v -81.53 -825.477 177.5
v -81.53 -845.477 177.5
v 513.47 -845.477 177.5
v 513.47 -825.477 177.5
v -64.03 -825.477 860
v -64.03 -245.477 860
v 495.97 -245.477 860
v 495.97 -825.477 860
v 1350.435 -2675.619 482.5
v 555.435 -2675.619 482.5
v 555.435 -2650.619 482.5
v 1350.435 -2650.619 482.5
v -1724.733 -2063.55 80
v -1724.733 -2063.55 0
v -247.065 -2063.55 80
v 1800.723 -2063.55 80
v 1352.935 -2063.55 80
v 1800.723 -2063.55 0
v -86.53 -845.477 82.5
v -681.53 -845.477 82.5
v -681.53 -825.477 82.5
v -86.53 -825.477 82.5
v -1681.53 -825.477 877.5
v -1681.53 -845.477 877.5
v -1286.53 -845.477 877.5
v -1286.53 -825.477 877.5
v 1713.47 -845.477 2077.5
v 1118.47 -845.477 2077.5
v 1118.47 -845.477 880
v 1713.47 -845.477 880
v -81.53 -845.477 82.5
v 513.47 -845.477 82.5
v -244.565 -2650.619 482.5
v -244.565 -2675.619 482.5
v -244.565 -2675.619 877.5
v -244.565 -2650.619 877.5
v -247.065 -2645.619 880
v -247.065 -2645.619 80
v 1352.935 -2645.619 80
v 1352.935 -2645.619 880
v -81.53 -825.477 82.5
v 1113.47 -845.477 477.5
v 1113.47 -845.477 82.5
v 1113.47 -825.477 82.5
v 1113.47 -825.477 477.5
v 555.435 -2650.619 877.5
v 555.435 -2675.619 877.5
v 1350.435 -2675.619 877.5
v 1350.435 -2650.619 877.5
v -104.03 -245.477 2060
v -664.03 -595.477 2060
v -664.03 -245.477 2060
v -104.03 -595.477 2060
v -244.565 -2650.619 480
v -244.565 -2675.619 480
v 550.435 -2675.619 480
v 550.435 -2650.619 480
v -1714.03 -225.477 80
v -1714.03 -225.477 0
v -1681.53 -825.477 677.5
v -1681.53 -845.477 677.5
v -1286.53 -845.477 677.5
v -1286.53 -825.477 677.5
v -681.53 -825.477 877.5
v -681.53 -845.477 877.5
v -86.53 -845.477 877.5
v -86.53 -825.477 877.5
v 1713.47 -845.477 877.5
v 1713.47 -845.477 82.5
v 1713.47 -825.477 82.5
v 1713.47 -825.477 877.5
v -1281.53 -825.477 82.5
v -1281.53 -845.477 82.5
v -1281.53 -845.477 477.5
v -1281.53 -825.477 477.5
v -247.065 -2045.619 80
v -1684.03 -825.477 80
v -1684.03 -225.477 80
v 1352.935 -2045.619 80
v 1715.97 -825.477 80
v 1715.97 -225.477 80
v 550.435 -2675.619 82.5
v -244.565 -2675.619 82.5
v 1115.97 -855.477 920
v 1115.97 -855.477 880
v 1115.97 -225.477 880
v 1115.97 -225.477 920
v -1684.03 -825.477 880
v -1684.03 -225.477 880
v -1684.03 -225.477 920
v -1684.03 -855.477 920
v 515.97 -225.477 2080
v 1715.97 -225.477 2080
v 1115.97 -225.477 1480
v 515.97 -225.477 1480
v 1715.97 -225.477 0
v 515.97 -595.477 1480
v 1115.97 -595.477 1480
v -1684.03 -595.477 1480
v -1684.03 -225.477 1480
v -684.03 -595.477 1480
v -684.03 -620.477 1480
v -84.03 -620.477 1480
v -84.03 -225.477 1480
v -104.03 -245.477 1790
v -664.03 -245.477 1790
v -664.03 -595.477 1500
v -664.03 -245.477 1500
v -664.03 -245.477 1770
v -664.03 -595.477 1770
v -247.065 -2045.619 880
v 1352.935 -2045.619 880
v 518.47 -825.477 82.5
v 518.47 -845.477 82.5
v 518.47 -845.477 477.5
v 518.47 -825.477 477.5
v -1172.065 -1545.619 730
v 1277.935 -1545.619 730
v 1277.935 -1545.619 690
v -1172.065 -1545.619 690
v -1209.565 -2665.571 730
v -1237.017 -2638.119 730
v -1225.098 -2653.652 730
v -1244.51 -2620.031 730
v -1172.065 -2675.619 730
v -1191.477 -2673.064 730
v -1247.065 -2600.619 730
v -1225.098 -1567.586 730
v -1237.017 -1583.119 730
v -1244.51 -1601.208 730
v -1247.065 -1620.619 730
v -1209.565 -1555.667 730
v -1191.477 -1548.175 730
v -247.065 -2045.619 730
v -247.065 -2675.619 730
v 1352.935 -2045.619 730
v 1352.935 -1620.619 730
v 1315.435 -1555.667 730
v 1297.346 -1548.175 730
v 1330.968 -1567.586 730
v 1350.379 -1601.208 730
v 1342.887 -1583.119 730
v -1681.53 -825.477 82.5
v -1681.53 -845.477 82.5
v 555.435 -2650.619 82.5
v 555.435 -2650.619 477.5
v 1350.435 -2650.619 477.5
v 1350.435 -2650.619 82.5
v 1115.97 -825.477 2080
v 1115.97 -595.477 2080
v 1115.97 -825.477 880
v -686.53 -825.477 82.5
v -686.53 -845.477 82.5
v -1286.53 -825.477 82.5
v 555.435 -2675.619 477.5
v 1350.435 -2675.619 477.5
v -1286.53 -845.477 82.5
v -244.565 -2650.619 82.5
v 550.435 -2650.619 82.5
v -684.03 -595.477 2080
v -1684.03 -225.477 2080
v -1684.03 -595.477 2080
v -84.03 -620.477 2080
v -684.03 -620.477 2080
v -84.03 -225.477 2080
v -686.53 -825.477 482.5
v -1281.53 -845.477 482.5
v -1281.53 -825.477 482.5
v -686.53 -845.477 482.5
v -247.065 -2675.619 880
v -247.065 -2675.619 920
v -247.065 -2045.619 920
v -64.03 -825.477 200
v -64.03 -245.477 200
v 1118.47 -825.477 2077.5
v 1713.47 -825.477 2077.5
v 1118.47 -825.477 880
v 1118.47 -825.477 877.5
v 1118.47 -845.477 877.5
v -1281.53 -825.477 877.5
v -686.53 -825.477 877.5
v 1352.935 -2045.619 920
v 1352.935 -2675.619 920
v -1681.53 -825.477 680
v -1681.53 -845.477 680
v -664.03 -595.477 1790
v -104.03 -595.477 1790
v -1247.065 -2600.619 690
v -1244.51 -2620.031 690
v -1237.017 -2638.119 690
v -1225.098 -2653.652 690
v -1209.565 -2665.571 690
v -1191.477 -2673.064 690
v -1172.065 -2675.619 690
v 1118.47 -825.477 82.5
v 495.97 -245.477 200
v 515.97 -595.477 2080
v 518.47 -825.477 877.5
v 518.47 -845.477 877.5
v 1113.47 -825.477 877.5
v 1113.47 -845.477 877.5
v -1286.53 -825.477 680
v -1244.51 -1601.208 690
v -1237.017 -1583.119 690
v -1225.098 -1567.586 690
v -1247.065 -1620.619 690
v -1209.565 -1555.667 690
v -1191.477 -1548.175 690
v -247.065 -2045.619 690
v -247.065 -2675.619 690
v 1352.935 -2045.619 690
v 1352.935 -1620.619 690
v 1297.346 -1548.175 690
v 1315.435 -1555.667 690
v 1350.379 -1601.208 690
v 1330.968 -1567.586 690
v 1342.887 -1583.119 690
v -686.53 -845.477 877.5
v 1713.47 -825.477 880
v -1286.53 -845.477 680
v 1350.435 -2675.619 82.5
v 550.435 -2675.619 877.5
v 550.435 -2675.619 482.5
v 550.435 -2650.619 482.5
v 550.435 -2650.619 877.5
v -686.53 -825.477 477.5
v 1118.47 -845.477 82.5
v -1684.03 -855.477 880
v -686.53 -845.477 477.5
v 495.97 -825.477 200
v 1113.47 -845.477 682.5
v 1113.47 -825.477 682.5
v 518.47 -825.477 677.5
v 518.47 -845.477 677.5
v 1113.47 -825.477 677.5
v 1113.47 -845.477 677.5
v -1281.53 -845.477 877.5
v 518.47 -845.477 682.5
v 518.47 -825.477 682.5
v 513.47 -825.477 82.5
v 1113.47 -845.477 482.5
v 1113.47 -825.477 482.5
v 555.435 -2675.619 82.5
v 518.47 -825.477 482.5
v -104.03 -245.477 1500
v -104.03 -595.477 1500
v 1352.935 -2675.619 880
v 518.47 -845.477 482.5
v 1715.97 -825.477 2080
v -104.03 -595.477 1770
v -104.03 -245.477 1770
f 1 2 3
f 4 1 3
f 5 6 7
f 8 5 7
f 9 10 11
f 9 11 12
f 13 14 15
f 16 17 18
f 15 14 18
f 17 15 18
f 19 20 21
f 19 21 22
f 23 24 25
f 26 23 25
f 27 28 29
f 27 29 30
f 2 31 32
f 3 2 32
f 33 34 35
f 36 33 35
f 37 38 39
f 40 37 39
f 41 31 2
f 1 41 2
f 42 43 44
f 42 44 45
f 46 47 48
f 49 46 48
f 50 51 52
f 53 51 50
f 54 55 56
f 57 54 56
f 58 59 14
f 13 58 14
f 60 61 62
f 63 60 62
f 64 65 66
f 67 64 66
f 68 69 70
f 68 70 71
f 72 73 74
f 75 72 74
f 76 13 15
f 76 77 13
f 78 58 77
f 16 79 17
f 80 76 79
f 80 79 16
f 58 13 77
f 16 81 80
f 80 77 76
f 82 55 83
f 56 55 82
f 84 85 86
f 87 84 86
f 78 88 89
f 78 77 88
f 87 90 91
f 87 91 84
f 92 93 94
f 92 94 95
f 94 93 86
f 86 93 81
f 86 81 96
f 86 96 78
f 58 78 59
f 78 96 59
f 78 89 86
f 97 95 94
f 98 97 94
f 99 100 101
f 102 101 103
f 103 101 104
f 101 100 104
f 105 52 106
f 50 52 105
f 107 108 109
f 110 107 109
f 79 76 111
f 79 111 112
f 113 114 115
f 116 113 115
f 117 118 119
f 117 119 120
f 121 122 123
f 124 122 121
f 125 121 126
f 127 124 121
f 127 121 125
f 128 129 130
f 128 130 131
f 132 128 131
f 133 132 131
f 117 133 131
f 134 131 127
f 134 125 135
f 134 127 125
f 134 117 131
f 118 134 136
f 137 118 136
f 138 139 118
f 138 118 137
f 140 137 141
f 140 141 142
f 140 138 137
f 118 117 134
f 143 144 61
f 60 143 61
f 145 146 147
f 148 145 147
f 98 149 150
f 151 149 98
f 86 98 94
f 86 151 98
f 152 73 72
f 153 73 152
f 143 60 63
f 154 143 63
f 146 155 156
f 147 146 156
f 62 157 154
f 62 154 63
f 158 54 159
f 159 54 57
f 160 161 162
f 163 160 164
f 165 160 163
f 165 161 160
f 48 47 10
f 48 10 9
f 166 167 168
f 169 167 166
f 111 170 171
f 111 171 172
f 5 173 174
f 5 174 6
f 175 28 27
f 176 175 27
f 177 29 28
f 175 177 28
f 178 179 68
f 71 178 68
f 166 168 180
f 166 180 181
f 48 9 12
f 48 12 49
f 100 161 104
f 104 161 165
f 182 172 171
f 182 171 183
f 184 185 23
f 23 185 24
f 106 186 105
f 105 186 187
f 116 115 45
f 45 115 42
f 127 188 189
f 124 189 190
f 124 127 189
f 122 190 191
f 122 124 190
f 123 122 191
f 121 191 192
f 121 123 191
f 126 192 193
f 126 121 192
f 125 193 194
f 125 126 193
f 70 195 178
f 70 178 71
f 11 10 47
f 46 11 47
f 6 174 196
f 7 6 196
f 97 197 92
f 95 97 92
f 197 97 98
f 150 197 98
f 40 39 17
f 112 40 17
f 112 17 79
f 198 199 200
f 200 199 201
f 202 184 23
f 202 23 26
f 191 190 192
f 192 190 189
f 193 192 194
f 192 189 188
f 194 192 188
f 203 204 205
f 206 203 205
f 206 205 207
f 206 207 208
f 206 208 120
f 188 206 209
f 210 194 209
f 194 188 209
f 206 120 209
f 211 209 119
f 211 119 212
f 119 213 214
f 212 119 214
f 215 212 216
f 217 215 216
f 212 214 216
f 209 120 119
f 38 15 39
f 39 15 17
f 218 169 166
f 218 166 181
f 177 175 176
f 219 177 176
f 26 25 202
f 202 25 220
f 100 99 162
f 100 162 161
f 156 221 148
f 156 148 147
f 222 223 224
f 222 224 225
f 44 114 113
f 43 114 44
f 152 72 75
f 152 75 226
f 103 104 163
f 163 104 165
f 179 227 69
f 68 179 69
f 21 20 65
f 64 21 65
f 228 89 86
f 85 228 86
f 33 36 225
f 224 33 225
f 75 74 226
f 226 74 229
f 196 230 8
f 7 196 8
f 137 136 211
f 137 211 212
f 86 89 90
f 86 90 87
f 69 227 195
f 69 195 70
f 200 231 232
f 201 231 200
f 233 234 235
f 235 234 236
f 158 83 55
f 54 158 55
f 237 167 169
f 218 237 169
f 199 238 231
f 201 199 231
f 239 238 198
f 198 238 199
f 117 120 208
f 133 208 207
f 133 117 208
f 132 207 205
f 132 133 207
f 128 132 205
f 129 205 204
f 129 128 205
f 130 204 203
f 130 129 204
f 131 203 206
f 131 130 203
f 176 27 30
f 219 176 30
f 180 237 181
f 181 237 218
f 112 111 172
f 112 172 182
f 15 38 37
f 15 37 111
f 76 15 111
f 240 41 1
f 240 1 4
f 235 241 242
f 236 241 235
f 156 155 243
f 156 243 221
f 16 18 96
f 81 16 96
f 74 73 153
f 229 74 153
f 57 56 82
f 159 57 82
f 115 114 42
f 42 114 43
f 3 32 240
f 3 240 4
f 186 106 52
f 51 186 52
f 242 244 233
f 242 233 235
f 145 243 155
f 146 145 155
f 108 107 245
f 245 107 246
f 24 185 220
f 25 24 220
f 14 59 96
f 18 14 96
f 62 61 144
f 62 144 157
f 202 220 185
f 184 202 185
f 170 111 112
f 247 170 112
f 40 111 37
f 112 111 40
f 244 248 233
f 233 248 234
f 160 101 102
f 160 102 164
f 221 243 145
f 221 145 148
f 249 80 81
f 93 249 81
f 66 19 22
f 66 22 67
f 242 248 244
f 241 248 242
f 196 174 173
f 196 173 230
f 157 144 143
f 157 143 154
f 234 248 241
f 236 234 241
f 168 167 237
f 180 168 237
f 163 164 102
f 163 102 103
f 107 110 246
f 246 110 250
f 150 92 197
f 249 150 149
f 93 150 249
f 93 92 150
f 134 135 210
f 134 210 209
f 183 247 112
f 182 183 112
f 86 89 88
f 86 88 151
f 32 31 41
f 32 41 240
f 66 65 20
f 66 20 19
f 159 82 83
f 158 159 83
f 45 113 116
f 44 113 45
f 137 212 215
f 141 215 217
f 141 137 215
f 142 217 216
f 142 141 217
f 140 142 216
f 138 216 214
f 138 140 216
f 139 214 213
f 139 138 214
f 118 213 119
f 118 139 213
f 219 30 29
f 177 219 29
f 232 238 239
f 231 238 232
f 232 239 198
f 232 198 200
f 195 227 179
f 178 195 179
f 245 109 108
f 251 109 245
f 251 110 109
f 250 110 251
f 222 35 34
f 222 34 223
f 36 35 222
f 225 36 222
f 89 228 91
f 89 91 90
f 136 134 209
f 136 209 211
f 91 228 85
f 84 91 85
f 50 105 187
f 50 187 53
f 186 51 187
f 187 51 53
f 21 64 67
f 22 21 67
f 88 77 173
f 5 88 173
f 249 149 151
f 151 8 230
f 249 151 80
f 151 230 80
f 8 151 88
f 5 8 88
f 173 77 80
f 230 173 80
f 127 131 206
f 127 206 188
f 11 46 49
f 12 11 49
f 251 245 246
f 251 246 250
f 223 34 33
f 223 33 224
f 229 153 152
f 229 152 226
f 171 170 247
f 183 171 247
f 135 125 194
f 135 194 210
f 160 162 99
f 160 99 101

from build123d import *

# Parameters (mm, degrees)
F7_W      = 600
F7_H      = 600
F13_DEPTH = 2000
F8_W      = 600
F8_H      = 600
F14_DEPTH = 800
F9_W      = 600
F9_H      = 600
F15_DEPTH = 800
F10_W     = 600
F10_H     = 600
F16_DEPTH = 800
F11_W     = 600
F11_H     = 600
F17_DEPTH = 800
F12_W     = 400
F12_H     = 600
F18_DEPTH = 800
F23_W     = 400
F23_H     = 370
F24_DEPTH = 1200
F25_W     = 400
F25_H     = 600
F26_DEPTH = 370
F22_W     = 600
F22_H     = 370
F27_DEPTH = 600
F21_W     = 600
F21_H     = 370
F28_DEPTH = 600
F20_W     = 600
F20_H     = 370
F29_DEPTH = 600
F30_DEPTH = 20
F32_DEPTH = 20
F31_W     = 595
F31_H     = 795
F33_DEPTH = 20
F35_DEPTH = 20
F34_W     = 395
F34_H     = 595
F36_DEPTH = 20
F37_W     = 600
F37_H     = 400
F37_W_2   = 595
F37_H_2   = 395
F38_DEPTH = 20
F39_DEPTH = 20
F40_W     = 600
F40_H     = 800
F40_W_2   = 595
F40_H_2   = 795
F41_DEPTH = 20
F42_W     = 600
F42_H     = 400
F42_W_2   = 595
F42_H_2   = 395
F43_DEPTH = 20
F44_W     = 600
F44_H     = 200
F44_W_2   = 595
F44_H_2   = 195
F45_DEPTH = 20
F46_W     = 600
F46_H     = 200
F46_W_2   = 595
F46_H_2   = 195
F47_DEPTH = 20
F48_W     = 600
F48_H     = 100
F48_W_2   = 595
F48_H_2   = 95
F49_DEPTH = 20
F50_W     = 600
F50_H     = 700
F50_W_2   = 560
F50_H_2   = 660
F51_DEPTH = 20
F52_DEPTH = 25
F54_W     = 560
F54_H     = 660
F55_DEPTH = 580
F57_W     = 560
F57_H     = 270
F58_DEPTH = 350
F59_DEPTH = 350
F60_W     = 600
F60_H     = 600
F61_DEPTH = 25
F64_DEPTH = 80
F62_W     = 800
F62_H     = 600
F65_DEPTH = 800
F63_W     = 800
F63_H     = 600
F66_DEPTH = 800
F68_W     = 1600
F68_H     = 800
F69_DEPTH = 25
F70_DEPTH = 20
F71_W     = 800
F71_H     = 400
F71_W_2   = 795
F71_H_2   = 395
F72_DEPTH = 25
F74_DEPTH = 25
F75_W     = 800
F75_H     = 400
F75_W_2   = 795
F75_H_2   = 395
F76_DEPTH = 25
F77_W     = 800
F77_H     = 400
F77_W_2   = 795
F77_H_2   = 395
F78_DEPTH = 25
F80_W     = 2800
F80_H     = 630
F82_DEPTH = 40
F81_W     = 1600
F81_H     = 630
F83_DEPTH = 40
F86_DEPTH = 40


with BuildPart() as f13:
    # F7 (on offset) → F13 (new body)
    with BuildSketch(Plane.XY.offset(80)):
        with Locations((1415.9702295065, -525.4769355059)):
            Rectangle(F7_W, F7_H)
    extrude(amount=F13_DEPTH)

    # F8 (on offset) → F14 (join)
    with BuildSketch(Plane.XY.offset(80)):
        with Locations((815.9702295065, -525.4769355059)):
            Rectangle(F8_W, F8_H)
    extrude(amount=F14_DEPTH)

    # F9 (on offset) → F15 (join)
    with BuildSketch(Plane.XY.offset(80)):
        with Locations((215.9702295065, -525.4769355059)):
            Rectangle(F9_W, F9_H)
    extrude(amount=F15_DEPTH)

    # F10 (on offset) → F16 (join)
    with BuildSketch(Plane.XY.offset(80)):
        with Locations((-384.0297704935, -525.4769355059)):
            Rectangle(F10_W, F10_H)
    extrude(amount=F16_DEPTH)

    # F11 (on offset) → F17 (join)
    with BuildSketch(Plane.XY.offset(80)):
        with Locations((-984.0297704935, -525.4769355059)):
            Rectangle(F11_W, F11_H)
    extrude(amount=F17_DEPTH)

    # F12 (on offset) → F18 (join)
    with BuildSketch(Plane.XY.offset(80)):
        with Locations((-1484.0297704935, -525.4769355059)):
            Rectangle(F12_W, F12_H)
    extrude(amount=F18_DEPTH)

    # F23 (on face) → F24 (join)
    with BuildSketch(Plane.XY.offset(880)):
        with Locations((-1484.0297704935, -410.4769355059)):
            Rectangle(F23_W, F23_H)
    extrude(amount=F24_DEPTH)

    # F25 (on face) → F26 (cut)
    with BuildSketch(Plane.XZ.offset(595.4769355059)):
        with Locations((-1484.0297704935, 1180)):
            Rectangle(F25_W, F25_H)
    extrude(amount=-F26_DEPTH, mode=Mode.SUBTRACT)

    # F22 (on face) → F27 (join)
    with BuildSketch(Plane.XY.offset(2080)):
        with Locations((-984.0297704935, -410.4769355059)):
            Rectangle(F22_W, F22_H)
    extrude(amount=-F27_DEPTH)

    # F21 (on face) → F28 (join)
    with BuildSketch(Plane.XY.offset(2080)):
        with Locations((-384.0297704935, -410.4769355059)):
            Rectangle(F21_W, F21_H)
    extrude(amount=-F28_DEPTH)

    # F20 (on face) → F29 (join)
    with BuildSketch(Plane.XY.offset(2080)):
        with Locations((815.9702295065, -410.4769355059)):
            Rectangle(F20_W, F20_H)
    extrude(amount=-F29_DEPTH)


with BuildPart() as f30:
    # F30 (new): a face of the model
    f30_faces = [f13.part.faces().sort_by_distance(p)[0] for p in [
        (308.9934853204, -825.4769355059, 689.3023255814),
    ]]
    extrude(f30_faces, amount=F30_DEPTH)

    # F31 (on face) → F32 (cut)
    with BuildSketch(Plane.XZ.offset(845.4769355059)):
        Polygon((1715.9702295065, 880), (1715.9702295065, 2080), (1115.9702295065, 2080), (1115.9702295065, 880), (1118.4702295065, 880), (1118.4702295065, 2077.5), (1713.4702295065, 2077.5), (1713.4702295065, 880), align=None)
    extrude(amount=-F32_DEPTH, mode=Mode.SUBTRACT)

    # F31 (on face) → F33 (cut)
    with BuildSketch(Plane.XZ.offset(845.4769355059)):
        Polygon((1715.9702295065, 80), (1715.9702295065, 880), (1713.4702295065, 880), (1118.4702295065, 880), (1115.9702295065, 880), (1115.9702295065, 80), align=None)
        with Locations((1415.9702295065, 480)):
            Rectangle(F31_W, F31_H, mode=Mode.SUBTRACT)
    extrude(amount=-F33_DEPTH, mode=Mode.SUBTRACT)

    # F34 (on face) → F35 (cut)
    with BuildSketch(Plane.XZ.offset(845.4769355059)):
        Polygon((-1284.0297704935, 880), (-1684.0297704935, 880), (-1684.0297704935, 680), (-1681.5297704935, 680), (-1681.5297704935, 877.5), (-1286.5297704935, 877.5), (-1286.5297704935, 680), (-1284.0297704935, 680), align=None)
    extrude(amount=-F35_DEPTH, mode=Mode.SUBTRACT)

    # F34 (on face) → F36 (cut)
    with BuildSketch(Plane.XZ.offset(845.4769355059)):
        Polygon((-1681.5297704935, 680), (-1684.0297704935, 680), (-1684.0297704935, 80), (-1284.0297704935, 80), (-1284.0297704935, 680), (-1286.5297704935, 680), align=None)
        with Locations((-1484.0297704935, 380)):
            Rectangle(F34_W, F34_H, mode=Mode.SUBTRACT)
    extrude(amount=-F36_DEPTH, mode=Mode.SUBTRACT)

    # F37 (on face) → F38 (cut)
    with BuildSketch(Plane.XZ.offset(845.4769355059)):
        with Locations((-984.0297704935, 680)):
            Rectangle(F37_W, F37_H)
        with Locations((-984.0297704935, 680)):
            Rectangle(F37_W_2, F37_H_2, mode=Mode.SUBTRACT)
    extrude(amount=-F38_DEPTH, mode=Mode.SUBTRACT)

    # F37 (on face) → F39 (cut)
    with BuildSketch(Plane.XZ.offset(845.4769355059)):
        with Locations((-984.0297704935, 280)):
            Rectangle(F37_W, F37_H)
        with Locations((-984.0297704935, 280)):
            Rectangle(F37_W_2, F37_H_2, mode=Mode.SUBTRACT)
    extrude(amount=-F39_DEPTH, mode=Mode.SUBTRACT)

    # F40 (on face) → F41 (cut)
    with BuildSketch(Plane.XZ.offset(845.4769355059)):
        with Locations((-384.0297704935, 480)):
            Rectangle(F40_W, F40_H)
        with Locations((-384.0297704935, 480)):
            Rectangle(F40_W_2, F40_H_2, mode=Mode.SUBTRACT)
    extrude(amount=-F41_DEPTH, mode=Mode.SUBTRACT)

    # F42 (on face) → F43 (cut)
    with BuildSketch(Plane.XZ.offset(845.4769355059)):
        with Locations((815.9702295065, 280)):
            Rectangle(F42_W, F42_H)
        with Locations((815.9702295065, 280)):
            Rectangle(F42_W_2, F42_H_2, mode=Mode.SUBTRACT)
    extrude(amount=-F43_DEPTH, mode=Mode.SUBTRACT)

    # F44 (on face) → F45 (cut)
    with BuildSketch(Plane.XZ.offset(845.4769355059)):
        with Locations((815.9702295065, 580)):
            Rectangle(F44_W, F44_H)
        with Locations((815.9702295065, 580)):
            Rectangle(F44_W_2, F44_H_2, mode=Mode.SUBTRACT)
    extrude(amount=-F45_DEPTH, mode=Mode.SUBTRACT)

    # F46 (on face) → F47 (cut)
    with BuildSketch(Plane.XZ.offset(845.4769355059)):
        with Locations((815.9702295065, 780)):
            Rectangle(F46_W, F46_H)
        with Locations((815.9702295065, 780)):
            Rectangle(F46_W_2, F46_H_2, mode=Mode.SUBTRACT)
    extrude(amount=-F47_DEPTH, mode=Mode.SUBTRACT)

    # F48 (on face) → F49 (cut)
    with BuildSketch(Plane.XZ.offset(845.4769355059)):
        with Locations((215.9702295065, 130)):
            Rectangle(F48_W, F48_H)
        with Locations((215.9702295065, 130)):
            Rectangle(F48_W_2, F48_H_2, mode=Mode.SUBTRACT)
    extrude(amount=-F49_DEPTH, mode=Mode.SUBTRACT)

    # F50 (on face) → F51 (cut)
    with BuildSketch(Plane.XZ.offset(845.4769355059)):
        with Locations((215.9702295065, 530)):
            Rectangle(F50_W, F50_H)
        with Locations((215.9702295065, 530)):
            Rectangle(F50_W_2, F50_H_2, mode=Mode.SUBTRACT)
    extrude(amount=-F51_DEPTH, mode=Mode.SUBTRACT)


with BuildPart() as f52_tool:
    # F50 (on face) → F52 (new body)
    with BuildSketch(Plane.XZ.offset(845.4769355059)):
        with Locations((215.9702295065, 530)):
            Rectangle(F50_W_2, F50_H_2)
    extrude(amount=-F52_DEPTH)


with BuildPart() as f13_1:
    add(f13.part)

    # F52: cut by f52_tool
    add(f52_tool.part, mode=Mode.SUBTRACT)

    # F54 (on offset) → F55 (cut)
    with BuildSketch(Plane.XZ.offset(825.4769355059)):
        with Locations((215.9702295065, 530)):
            Rectangle(F54_W, F54_H)
    extrude(amount=-F55_DEPTH, mode=Mode.SUBTRACT)

    # F57 (on face) → F58 (cut)
    with BuildSketch(Plane.XZ.offset(595.4769355059)):
        with Locations((-384.0297704935, 1925)):
            Rectangle(F57_W, F57_H)
    extrude(amount=-F58_DEPTH, mode=Mode.SUBTRACT)

    # F57 (on face) → F59 (cut)
    with BuildSketch(Plane.XZ.offset(595.4769355059)):
        with Locations((-384.0297704935, 1635)):
            Rectangle(F57_W, F57_H)
    extrude(amount=-F59_DEPTH, mode=Mode.SUBTRACT)

    # F60 (on face) → F61 (join)
    with BuildSketch(Plane.XZ.offset(595.4769355059)):
        with Locations((-384.0297704935, 1780)):
            Rectangle(F60_W, F60_H)
    extrude(amount=F61_DEPTH)

    # F0 (on Top) → F64 (join)
    with BuildSketch(Plane.XY):
        Polygon((1800.7225357622, -2063.5498418479), (1715.9702295065, -225.4769355059), (-1714.0297704935, -225.4769355059), (-1724.7334718704, -2063.5498418479), align=None)
    extrude(amount=F64_DEPTH)

    # F62 (on offset) → F65 (join)
    with BuildSketch(Plane.XY.offset(80)):
        with Locations((952.9347419739, -2345.6193135348)):
            Rectangle(F62_W, F62_H)
    extrude(amount=F65_DEPTH)

    # F63 (on offset) → F66 (join)
    with BuildSketch(Plane.XY.offset(80)):
        with Locations((152.9347419739, -2345.6193135348)):
            Rectangle(F63_W, F63_H)
    extrude(amount=F66_DEPTH)


with BuildPart() as f30_1:
    add(f30.part)

    # F52: cut by f52_tool
    add(f52_tool.part, mode=Mode.SUBTRACT)


with BuildPart() as f69:
    # F68 (on offset) → F69 (new body)
    with BuildSketch(Plane.XZ.offset(2650.6193135348)):
        with Locations((552.9347419739, 480)):
            Rectangle(F68_W, F68_H)
    extrude(amount=F69_DEPTH)

    # F68 (on offset) → F70 (join)
    with BuildSketch(Plane.XZ.offset(2650.6193135348)):
        with Locations((552.9347419739, 480)):
            Rectangle(F68_W, F68_H)
    extrude(amount=F70_DEPTH)

    # F71 (on face) → F72 (cut)
    with BuildSketch(Plane.XZ.offset(2675.6193135348)):
        with Locations((152.9347419739, 680)):
            Rectangle(F71_W, F71_H)
        with Locations((152.9347419739, 680)):
            Rectangle(F71_W_2, F71_H_2, mode=Mode.SUBTRACT)
    extrude(amount=-F72_DEPTH, mode=Mode.SUBTRACT)

    # F73 (on face) → F74 (cut)
    with BuildSketch(Plane.XZ.offset(2675.6193135348)):
        Polygon((-244.5652580261, 480), (-247.0652580261, 480), (-247.0652580261, 80), (552.9347419739, 80), (552.9347419739, 480), (550.4347419739, 480), (550.4347419739, 82.5), (-244.5652580261, 82.5), align=None)
    extrude(amount=-F74_DEPTH, mode=Mode.SUBTRACT)

    # F75 (on face) → F76 (cut)
    with BuildSketch(Plane.XZ.offset(2675.6193135348)):
        with Locations((952.9347419739, 680)):
            Rectangle(F75_W, F75_H)
        with Locations((952.9347419739, 680)):
            Rectangle(F75_W_2, F75_H_2, mode=Mode.SUBTRACT)
    extrude(amount=-F76_DEPTH, mode=Mode.SUBTRACT)

    # F77 (on face) → F78 (cut)
    with BuildSketch(Plane.XZ.offset(2675.6193135348)):
        with Locations((952.9347419739, 280)):
            Rectangle(F77_W, F77_H)
        with Locations((952.9347419739, 280)):
            Rectangle(F77_W_2, F77_H_2, mode=Mode.SUBTRACT)
    extrude(amount=-F78_DEPTH, mode=Mode.SUBTRACT)


with BuildPart() as f82:
    # F80 (on face) → F82 (new body)
    with BuildSketch(Plane.XY.offset(880)):
        with Locations((-284.0297704935, -540.4769355059)):
            Rectangle(F80_W, F80_H)
    extrude(amount=F82_DEPTH)


with BuildPart() as f83:
    # F81 (on face) → F83 (new body)
    with BuildSketch(Plane.XY.offset(880)):
        with Locations((552.9347419739, -2360.6193135348)):
            Rectangle(F81_W, F81_H)
    extrude(amount=F83_DEPTH)


with BuildPart() as f86:
    # F85 (on offset) → F86 (new body)
    with BuildSketch(Plane.XY.offset(730)):
        with BuildLine():
            Line((-247.0652580261, -2045.6193135348), (1352.9347419739, -2045.6193135348))
            Line((1352.9347419739, -2045.6193135348), (1352.9347419739, -1695.6193135348))
            Line((1352.9347419739, -1695.6193135348), (1352.9347419739, -1620.6193135348))
            ThreePointArc((1352.9347419739, -1620.6193135348), (1330.9677505629, -1567.5863049458), (1277.9347419739, -1545.6193135348))
            Line((1277.9347419739, -1545.6193135348), (1202.9347419739, -1545.6193135348))
            Line((1202.9347419739, -1545.6193135348), (-1097.0652580261, -1545.6193135348))
            Line((-1097.0652580261, -1545.6193135348), (-1172.0652580261, -1545.6193135348))
            ThreePointArc((-1172.0652580261, -1545.6193135348), (-1225.0982666151, -1567.5863049458), (-1247.0652580261, -1620.6193135348))
            Line((-1247.0652580261, -1620.6193135348), (-1247.0652580261, -1695.6193135348))
            Line((-1247.0652580261, -1695.6193135348), (-1247.0652580261, -2525.6193135348))
            Line((-1247.0652580261, -2525.6193135348), (-1247.0652580261, -2600.6193135348))
            ThreePointArc((-1247.0652580261, -2600.6193135348), (-1225.0982666151, -2653.6523221238), (-1172.0652580261, -2675.6193135348))
            Line((-1172.0652580261, -2675.6193135348), (-1097.0652580261, -2675.6193135348))
            Line((-1097.0652580261, -2675.6193135348), (-247.0652580261, -2675.6193135348))
            Line((-247.0652580261, -2675.6193135348), (-247.0652580261, -2045.6193135348))
        make_face()
    extrude(amount=-F86_DEPTH)


solid = Compound([f13_1.part, f30_1.part, f69.part, f82.part, f83.part, f86.part])
